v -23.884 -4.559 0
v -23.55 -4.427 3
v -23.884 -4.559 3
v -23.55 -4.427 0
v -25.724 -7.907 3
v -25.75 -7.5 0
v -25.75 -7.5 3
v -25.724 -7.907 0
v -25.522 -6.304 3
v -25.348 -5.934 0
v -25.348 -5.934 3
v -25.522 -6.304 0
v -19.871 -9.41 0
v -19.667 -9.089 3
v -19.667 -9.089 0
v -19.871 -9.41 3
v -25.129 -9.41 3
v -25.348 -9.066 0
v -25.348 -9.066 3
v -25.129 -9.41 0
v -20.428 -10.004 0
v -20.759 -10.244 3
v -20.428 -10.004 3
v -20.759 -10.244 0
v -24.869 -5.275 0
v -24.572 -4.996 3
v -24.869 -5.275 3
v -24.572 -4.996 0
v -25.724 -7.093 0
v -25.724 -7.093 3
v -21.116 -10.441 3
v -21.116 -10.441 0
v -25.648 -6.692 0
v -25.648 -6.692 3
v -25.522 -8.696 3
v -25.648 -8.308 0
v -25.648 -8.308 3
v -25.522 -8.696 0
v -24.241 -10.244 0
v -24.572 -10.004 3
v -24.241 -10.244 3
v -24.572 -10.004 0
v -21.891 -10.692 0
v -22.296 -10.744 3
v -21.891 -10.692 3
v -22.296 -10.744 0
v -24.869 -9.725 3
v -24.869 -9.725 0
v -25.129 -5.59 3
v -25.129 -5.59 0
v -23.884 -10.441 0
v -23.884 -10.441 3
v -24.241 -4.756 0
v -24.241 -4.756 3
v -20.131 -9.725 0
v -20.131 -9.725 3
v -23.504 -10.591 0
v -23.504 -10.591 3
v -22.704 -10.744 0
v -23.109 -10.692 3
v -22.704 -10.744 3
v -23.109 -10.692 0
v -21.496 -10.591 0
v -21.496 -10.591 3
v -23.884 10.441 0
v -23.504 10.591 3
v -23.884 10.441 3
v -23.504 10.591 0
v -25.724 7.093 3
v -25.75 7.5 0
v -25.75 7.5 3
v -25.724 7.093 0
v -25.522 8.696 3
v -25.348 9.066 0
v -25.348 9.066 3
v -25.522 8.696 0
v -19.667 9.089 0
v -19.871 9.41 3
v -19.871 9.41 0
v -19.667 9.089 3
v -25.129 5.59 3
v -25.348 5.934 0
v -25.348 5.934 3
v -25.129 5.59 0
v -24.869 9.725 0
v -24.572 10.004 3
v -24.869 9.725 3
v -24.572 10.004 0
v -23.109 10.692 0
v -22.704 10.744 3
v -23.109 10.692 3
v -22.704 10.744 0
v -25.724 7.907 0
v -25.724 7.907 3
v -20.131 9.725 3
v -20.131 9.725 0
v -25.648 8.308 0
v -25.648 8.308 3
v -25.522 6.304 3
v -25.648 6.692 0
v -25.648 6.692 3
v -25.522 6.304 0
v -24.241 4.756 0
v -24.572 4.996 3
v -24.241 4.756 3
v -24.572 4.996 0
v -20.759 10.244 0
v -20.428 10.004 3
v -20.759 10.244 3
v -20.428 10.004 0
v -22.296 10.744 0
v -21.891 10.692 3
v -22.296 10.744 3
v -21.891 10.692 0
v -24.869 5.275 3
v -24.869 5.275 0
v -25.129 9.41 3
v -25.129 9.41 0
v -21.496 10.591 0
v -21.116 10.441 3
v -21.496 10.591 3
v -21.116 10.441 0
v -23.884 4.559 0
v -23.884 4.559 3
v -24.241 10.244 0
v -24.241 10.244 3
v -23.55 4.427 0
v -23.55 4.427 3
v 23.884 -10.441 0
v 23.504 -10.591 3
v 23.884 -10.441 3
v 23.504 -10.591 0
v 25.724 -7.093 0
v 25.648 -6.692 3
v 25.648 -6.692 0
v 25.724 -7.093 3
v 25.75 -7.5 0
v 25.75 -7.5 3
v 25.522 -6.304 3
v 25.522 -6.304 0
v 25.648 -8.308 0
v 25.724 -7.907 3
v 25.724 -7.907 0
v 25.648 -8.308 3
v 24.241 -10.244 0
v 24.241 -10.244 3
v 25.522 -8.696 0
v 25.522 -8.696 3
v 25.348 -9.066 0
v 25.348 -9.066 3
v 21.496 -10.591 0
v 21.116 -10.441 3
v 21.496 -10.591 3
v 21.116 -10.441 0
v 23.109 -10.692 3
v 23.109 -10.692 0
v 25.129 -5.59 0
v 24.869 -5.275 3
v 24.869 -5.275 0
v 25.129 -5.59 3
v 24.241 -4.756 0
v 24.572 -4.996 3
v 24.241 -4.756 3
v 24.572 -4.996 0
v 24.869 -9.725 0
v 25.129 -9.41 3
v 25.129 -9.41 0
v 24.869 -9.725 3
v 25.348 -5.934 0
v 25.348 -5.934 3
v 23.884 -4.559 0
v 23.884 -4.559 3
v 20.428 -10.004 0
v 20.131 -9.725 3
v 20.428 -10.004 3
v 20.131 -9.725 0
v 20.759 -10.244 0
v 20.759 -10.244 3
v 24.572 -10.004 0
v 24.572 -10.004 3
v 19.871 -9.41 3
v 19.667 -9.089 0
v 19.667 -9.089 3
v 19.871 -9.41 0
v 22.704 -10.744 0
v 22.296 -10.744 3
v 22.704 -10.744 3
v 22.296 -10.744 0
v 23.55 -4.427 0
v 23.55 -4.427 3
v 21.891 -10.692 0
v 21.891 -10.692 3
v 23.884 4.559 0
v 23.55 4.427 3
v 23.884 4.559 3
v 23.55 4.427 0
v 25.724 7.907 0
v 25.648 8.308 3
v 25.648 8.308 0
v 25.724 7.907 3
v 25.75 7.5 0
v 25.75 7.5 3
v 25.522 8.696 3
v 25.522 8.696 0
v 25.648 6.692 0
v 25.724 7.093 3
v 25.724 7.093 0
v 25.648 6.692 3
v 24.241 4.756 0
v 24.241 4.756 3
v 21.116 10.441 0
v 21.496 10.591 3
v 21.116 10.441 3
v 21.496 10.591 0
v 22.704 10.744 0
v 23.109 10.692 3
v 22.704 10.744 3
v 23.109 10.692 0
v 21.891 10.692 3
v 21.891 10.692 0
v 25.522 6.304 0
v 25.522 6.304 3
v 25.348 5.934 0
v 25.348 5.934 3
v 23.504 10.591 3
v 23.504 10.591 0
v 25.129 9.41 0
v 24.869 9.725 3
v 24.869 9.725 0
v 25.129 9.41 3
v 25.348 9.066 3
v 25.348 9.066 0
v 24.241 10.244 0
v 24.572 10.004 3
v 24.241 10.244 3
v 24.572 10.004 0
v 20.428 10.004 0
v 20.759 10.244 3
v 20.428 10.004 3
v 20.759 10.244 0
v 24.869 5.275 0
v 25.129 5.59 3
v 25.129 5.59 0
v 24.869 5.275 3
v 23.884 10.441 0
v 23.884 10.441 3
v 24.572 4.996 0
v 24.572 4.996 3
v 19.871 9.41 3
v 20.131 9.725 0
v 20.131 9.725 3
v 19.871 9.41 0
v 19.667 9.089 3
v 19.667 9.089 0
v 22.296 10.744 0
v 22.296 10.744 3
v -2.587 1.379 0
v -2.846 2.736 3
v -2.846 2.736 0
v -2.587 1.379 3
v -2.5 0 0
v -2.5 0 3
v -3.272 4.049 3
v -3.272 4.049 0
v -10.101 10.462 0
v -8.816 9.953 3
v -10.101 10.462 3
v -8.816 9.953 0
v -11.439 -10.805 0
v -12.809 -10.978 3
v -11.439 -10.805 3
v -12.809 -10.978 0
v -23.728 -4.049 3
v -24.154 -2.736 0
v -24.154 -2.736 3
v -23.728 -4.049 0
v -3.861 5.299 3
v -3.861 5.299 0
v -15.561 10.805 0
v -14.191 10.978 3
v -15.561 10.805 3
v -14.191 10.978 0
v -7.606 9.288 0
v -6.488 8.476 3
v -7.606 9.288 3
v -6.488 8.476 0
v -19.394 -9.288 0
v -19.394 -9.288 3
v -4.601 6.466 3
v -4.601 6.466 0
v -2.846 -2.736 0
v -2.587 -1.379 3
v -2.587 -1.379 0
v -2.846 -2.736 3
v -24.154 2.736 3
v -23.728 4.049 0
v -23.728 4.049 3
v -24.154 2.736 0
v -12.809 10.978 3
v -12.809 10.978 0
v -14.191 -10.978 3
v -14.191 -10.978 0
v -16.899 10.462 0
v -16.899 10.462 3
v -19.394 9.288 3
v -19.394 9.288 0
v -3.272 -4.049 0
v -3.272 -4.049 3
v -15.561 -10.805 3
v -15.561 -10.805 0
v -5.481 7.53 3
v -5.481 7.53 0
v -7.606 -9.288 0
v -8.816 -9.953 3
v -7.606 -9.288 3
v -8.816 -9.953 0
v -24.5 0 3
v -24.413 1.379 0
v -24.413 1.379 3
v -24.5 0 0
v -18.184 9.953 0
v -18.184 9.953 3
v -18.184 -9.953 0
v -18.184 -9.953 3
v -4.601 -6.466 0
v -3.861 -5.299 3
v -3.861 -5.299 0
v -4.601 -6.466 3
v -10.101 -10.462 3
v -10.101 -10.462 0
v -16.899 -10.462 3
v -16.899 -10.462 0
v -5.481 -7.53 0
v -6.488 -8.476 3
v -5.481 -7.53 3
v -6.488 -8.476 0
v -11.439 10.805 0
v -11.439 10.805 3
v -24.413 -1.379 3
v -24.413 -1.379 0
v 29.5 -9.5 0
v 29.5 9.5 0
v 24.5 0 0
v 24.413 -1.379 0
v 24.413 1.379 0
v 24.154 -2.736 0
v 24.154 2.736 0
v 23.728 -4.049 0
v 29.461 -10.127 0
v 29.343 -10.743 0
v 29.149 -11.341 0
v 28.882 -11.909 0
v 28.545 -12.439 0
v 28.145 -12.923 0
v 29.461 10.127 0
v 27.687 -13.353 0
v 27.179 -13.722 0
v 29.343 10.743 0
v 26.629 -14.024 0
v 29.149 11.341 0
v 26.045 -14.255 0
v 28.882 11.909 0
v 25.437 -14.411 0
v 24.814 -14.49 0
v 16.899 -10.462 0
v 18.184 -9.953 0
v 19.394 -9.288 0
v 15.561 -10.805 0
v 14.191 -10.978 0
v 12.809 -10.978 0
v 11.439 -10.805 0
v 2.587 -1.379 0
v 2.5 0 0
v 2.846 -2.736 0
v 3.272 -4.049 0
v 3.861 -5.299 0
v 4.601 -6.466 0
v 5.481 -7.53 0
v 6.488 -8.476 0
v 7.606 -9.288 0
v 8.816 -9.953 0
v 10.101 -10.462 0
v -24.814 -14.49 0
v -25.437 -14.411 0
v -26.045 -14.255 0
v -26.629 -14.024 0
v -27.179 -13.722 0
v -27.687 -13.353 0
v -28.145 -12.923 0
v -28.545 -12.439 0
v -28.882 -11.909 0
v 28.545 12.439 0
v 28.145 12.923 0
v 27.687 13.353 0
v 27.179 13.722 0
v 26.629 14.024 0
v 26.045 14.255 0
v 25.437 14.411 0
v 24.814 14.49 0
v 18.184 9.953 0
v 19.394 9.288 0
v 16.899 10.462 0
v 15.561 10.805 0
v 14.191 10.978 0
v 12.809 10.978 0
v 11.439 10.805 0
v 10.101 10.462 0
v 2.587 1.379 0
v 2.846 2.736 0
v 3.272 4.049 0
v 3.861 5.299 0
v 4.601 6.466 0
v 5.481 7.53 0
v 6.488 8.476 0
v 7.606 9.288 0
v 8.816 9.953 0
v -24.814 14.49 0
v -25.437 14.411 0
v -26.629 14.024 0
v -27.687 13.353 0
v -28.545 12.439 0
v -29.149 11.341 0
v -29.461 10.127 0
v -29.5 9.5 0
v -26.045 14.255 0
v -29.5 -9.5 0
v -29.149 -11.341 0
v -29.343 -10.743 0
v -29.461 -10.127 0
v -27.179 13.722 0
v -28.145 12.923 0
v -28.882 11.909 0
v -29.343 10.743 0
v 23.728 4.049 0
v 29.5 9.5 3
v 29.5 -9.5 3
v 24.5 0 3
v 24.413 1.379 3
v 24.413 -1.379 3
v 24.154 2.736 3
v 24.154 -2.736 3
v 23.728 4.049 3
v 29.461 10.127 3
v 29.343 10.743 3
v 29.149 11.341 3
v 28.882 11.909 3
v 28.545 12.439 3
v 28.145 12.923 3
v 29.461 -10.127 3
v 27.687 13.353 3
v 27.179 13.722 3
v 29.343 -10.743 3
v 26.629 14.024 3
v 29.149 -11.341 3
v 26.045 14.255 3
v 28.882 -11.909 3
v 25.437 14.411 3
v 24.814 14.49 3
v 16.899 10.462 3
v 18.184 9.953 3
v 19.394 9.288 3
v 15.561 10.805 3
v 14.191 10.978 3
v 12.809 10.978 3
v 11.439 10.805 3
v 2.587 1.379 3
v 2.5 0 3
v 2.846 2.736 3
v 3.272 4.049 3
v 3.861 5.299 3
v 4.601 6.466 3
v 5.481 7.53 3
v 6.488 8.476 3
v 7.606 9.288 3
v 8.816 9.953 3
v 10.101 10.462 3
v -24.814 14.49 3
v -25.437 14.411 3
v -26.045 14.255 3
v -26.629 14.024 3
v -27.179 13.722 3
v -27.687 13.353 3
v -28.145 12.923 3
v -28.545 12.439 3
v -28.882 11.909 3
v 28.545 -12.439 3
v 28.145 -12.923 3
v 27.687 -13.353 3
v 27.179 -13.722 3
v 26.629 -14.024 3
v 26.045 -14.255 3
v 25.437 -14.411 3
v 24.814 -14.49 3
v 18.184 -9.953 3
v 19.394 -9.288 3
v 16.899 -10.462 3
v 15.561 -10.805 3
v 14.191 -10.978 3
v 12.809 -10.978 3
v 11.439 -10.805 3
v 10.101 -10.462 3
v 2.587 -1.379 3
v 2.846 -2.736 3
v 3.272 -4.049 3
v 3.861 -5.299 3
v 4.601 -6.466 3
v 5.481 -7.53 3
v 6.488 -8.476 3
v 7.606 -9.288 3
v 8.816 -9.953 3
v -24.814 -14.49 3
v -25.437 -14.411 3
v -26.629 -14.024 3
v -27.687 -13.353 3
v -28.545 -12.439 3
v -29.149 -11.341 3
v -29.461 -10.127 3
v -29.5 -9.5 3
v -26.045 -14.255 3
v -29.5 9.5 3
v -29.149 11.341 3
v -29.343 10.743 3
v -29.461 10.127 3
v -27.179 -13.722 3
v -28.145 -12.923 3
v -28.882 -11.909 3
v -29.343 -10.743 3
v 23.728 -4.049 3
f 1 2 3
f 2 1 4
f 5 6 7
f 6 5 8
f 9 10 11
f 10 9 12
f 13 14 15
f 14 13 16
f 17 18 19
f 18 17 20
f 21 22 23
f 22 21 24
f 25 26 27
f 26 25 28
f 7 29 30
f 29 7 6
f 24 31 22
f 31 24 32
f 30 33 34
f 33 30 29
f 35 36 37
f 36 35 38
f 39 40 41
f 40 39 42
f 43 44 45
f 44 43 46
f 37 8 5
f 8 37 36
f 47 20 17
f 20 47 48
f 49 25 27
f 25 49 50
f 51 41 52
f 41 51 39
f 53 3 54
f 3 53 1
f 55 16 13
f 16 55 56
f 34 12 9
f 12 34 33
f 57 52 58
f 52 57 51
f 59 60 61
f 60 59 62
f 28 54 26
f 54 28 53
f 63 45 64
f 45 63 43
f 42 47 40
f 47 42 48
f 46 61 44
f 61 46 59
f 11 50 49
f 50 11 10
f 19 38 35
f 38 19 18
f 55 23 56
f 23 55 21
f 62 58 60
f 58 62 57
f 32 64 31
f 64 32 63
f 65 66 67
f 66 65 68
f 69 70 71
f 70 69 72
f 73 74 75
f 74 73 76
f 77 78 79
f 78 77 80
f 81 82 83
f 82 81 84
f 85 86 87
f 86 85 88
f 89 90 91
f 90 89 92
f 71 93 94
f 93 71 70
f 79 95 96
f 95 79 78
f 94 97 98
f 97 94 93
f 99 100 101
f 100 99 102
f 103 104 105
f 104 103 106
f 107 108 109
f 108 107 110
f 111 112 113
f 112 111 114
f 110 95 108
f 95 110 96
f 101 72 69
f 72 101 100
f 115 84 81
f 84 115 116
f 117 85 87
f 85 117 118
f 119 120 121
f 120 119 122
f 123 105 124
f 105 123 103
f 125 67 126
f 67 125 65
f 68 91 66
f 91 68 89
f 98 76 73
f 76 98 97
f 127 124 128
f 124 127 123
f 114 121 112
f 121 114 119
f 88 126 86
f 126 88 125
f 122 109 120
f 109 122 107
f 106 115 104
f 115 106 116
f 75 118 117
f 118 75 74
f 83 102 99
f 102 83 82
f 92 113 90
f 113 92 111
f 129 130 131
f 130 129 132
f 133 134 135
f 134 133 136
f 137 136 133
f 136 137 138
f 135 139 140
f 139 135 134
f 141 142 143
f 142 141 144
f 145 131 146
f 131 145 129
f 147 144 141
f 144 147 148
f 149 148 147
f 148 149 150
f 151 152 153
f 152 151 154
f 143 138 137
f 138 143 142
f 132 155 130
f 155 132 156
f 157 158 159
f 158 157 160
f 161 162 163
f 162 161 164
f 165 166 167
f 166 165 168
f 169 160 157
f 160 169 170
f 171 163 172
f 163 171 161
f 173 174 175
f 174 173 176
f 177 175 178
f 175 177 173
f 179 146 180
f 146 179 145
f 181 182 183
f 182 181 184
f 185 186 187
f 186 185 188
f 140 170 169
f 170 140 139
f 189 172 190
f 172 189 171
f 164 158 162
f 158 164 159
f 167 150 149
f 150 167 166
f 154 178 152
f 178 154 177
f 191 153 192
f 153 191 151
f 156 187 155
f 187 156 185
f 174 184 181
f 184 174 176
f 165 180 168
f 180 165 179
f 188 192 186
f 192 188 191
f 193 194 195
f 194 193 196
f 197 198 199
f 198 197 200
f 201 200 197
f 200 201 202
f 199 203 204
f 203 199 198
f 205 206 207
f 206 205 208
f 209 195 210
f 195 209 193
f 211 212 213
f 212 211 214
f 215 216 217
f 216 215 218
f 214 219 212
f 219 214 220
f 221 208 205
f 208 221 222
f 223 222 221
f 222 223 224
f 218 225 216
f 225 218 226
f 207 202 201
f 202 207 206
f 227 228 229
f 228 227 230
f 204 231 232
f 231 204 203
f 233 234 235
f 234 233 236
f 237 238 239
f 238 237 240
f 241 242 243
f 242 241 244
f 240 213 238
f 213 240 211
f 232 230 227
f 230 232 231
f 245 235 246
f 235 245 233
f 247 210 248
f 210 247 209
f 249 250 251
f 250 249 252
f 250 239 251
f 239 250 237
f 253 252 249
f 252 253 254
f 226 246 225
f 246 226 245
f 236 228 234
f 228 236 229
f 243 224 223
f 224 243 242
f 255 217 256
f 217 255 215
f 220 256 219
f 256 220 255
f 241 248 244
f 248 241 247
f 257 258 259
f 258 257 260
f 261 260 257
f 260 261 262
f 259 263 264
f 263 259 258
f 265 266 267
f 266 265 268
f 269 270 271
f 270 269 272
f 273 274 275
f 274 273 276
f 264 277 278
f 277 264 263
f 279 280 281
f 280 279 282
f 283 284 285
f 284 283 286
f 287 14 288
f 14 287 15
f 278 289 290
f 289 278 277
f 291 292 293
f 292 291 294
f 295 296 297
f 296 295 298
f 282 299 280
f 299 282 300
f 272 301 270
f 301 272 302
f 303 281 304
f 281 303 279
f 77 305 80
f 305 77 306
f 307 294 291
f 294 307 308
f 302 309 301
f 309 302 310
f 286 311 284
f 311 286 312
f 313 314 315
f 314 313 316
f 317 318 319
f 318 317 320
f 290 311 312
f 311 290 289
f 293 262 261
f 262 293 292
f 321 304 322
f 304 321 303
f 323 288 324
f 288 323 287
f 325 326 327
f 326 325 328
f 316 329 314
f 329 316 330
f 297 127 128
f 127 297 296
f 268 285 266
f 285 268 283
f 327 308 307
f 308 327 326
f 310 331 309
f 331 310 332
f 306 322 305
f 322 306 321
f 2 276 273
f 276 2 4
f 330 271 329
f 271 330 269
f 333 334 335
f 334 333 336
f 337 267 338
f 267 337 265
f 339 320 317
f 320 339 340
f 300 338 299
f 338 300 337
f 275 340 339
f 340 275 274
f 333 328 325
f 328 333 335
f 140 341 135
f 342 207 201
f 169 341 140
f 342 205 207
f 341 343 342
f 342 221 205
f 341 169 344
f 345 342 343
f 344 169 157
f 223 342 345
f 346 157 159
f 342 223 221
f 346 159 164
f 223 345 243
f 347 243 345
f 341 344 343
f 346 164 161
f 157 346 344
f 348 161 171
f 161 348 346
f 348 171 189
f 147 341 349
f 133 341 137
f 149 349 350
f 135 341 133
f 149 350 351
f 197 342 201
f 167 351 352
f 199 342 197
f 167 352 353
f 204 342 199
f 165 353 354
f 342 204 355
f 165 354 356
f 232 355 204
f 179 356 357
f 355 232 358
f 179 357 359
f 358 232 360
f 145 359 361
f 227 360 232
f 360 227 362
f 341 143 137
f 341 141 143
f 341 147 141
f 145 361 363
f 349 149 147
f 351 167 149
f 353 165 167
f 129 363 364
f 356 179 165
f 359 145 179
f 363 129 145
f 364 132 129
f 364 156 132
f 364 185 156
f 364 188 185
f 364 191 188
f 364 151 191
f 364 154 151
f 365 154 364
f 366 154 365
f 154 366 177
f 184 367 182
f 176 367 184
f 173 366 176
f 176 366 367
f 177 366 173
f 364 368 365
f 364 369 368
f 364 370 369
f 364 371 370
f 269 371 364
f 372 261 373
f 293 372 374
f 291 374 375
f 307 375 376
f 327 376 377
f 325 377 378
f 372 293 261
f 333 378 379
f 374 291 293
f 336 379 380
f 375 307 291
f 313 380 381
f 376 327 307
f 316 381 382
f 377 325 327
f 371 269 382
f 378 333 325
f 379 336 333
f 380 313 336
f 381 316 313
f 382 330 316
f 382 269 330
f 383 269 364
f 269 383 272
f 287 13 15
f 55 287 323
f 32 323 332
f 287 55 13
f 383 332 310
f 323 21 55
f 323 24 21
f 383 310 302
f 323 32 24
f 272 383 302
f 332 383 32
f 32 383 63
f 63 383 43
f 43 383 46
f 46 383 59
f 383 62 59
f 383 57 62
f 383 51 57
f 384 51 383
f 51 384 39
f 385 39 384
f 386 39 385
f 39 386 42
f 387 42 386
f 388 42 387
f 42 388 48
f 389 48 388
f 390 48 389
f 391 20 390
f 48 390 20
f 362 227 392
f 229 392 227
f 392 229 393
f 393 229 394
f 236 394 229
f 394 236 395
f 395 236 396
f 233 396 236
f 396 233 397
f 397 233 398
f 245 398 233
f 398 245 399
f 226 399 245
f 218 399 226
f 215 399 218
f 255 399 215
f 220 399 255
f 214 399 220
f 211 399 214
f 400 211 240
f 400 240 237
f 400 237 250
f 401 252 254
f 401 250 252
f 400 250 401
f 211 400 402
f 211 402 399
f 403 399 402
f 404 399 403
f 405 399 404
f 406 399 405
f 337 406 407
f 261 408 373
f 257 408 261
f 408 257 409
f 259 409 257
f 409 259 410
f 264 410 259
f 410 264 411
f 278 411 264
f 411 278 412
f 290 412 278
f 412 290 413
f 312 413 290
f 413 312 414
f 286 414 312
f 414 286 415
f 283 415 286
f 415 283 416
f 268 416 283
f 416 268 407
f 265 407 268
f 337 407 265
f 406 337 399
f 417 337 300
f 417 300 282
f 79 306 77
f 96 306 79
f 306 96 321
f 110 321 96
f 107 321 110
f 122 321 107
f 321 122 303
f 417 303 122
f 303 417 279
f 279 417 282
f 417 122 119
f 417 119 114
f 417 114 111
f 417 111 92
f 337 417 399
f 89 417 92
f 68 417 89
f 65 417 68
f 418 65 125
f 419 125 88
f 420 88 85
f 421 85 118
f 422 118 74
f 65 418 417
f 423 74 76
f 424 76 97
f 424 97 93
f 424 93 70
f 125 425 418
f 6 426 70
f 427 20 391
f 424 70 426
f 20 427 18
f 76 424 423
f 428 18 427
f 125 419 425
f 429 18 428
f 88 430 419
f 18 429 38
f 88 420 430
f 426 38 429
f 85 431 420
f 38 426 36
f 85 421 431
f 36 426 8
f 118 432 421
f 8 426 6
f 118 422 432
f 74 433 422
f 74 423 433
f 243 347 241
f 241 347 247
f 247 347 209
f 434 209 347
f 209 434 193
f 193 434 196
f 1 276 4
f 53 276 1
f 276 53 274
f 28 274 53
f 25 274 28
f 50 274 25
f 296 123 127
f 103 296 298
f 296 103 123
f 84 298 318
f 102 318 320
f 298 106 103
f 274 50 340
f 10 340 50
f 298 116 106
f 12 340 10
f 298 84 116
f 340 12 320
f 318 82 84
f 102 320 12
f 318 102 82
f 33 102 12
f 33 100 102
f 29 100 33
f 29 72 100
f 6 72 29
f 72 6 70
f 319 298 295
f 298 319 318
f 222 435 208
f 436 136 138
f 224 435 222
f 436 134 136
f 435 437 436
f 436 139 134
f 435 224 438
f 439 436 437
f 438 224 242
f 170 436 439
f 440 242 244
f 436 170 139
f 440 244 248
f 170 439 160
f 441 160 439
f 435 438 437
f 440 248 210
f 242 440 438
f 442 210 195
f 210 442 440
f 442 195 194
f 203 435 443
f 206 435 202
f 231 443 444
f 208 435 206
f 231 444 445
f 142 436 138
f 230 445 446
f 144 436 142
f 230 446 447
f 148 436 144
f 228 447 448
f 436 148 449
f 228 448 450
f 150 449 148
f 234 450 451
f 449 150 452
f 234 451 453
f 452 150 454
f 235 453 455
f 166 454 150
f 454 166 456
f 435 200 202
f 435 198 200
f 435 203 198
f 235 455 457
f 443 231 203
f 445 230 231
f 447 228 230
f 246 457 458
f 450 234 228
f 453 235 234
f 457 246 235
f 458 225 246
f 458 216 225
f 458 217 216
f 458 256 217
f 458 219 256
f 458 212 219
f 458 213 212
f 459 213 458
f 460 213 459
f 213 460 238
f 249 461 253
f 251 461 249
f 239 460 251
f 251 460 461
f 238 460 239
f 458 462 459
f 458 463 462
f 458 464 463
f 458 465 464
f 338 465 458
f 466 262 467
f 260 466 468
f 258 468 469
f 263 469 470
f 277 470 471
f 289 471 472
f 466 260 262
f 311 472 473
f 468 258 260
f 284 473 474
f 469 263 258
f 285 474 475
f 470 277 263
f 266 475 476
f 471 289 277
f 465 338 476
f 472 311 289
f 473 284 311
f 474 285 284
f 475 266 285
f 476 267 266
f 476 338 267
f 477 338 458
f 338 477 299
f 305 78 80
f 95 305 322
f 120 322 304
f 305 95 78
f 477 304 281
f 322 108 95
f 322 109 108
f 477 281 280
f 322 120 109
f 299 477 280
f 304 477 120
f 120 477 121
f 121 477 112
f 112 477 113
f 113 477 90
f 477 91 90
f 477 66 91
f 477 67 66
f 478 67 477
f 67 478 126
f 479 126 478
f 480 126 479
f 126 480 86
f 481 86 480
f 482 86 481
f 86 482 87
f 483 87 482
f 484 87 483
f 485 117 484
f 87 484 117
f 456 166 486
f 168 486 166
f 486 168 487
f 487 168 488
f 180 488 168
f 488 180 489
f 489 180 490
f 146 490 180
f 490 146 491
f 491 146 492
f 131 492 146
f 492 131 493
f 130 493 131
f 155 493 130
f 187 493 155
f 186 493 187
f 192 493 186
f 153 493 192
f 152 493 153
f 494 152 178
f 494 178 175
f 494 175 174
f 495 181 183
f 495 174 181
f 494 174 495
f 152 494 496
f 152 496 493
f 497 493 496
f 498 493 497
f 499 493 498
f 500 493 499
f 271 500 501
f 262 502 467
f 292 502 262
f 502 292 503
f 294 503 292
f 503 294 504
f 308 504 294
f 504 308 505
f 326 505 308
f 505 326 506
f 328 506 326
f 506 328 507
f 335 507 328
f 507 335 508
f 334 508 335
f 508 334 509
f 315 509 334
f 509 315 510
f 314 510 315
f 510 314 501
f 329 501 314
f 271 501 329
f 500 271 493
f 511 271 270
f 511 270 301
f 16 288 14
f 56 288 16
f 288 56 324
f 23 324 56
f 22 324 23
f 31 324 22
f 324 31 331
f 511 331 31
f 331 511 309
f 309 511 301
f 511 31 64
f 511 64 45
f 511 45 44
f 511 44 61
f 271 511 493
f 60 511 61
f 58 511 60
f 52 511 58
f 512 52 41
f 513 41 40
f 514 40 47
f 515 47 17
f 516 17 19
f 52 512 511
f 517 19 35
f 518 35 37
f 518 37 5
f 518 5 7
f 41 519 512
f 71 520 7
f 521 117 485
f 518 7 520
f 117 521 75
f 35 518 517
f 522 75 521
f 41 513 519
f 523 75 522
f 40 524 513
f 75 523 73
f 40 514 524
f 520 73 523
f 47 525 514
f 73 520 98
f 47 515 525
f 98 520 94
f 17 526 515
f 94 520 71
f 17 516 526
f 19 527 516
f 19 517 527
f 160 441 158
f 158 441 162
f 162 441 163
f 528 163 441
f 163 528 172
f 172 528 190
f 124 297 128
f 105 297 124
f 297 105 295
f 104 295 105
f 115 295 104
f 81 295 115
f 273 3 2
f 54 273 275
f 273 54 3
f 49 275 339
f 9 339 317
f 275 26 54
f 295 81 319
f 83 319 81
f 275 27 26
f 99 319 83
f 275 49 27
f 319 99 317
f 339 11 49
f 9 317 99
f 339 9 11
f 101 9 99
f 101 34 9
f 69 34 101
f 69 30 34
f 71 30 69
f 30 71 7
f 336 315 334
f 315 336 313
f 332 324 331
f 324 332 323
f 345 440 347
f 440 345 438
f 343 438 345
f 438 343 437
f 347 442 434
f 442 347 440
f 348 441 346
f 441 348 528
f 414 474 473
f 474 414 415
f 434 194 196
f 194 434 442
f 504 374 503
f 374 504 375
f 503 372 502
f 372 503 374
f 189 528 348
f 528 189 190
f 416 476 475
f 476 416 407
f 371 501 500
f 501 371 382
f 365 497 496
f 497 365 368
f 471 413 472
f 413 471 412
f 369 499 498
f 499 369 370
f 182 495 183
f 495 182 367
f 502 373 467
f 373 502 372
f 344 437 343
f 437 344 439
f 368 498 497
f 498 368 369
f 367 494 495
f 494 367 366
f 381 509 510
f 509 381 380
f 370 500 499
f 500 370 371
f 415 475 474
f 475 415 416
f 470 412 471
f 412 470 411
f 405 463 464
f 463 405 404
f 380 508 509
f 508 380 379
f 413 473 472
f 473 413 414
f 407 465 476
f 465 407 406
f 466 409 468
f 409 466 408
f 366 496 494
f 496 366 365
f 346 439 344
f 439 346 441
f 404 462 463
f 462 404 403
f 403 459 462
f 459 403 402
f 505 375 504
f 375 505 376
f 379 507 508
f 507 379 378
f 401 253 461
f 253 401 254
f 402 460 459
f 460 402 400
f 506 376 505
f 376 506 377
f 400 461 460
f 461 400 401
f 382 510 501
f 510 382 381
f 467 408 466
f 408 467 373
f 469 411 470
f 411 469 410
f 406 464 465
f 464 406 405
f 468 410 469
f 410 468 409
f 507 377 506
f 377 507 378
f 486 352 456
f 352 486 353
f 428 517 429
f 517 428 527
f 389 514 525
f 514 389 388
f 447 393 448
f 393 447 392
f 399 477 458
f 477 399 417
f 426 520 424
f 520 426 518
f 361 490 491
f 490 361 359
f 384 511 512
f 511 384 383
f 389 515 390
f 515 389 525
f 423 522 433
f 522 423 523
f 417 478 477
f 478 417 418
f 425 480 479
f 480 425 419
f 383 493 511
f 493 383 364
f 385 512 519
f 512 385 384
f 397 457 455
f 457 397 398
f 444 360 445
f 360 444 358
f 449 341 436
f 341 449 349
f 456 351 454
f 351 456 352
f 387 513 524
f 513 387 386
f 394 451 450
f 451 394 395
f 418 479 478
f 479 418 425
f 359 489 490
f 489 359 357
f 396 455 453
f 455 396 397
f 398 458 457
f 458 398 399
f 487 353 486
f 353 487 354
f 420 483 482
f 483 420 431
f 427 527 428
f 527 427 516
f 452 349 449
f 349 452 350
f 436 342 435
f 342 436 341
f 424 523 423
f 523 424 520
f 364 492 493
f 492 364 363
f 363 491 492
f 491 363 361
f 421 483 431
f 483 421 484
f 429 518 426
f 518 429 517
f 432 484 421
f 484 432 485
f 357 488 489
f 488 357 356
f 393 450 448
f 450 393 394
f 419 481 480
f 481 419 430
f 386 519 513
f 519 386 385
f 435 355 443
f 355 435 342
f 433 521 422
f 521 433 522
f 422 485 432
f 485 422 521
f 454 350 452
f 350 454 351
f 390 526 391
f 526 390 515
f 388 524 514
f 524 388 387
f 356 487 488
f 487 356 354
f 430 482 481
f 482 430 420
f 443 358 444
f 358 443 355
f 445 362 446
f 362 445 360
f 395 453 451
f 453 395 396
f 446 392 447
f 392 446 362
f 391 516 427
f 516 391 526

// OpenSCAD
$fn = 50;


difference() {
	union() {
		hull() {
			translate(v = [-24.5000000000, 9.5000000000, 0]) {
				cylinder(h = 3, r = 5);
			}
			translate(v = [24.5000000000, 9.5000000000, 0]) {
				cylinder(h = 3, r = 5);
			}
			translate(v = [-24.5000000000, -9.5000000000, 0]) {
				cylinder(h = 3, r = 5);
			}
			translate(v = [24.5000000000, -9.5000000000, 0]) {
				cylinder(h = 3, r = 5);
			}
		}
	}
	union() {
		#translate(v = [-22.5000000000, -7.5000000000, -100.0000000000]) {
			cylinder(h = 200, r = 3.2500000000);
		}
		#translate(v = [-22.5000000000, 7.5000000000, -100.0000000000]) {
			cylinder(h = 200, r = 3.2500000000);
		}
		#translate(v = [22.5000000000, -7.5000000000, -100.0000000000]) {
			cylinder(h = 200, r = 3.2500000000);
		}
		#translate(v = [22.5000000000, 7.5000000000, -100.0000000000]) {
			cylinder(h = 200, r = 3.2500000000);
		}
		#translate(v = [-13.5000000000, 0, 0]) {
			cylinder(h = 3, r = 11.0000000000);
		}
		#translate(v = [13.5000000000, 0, 0]) {
			cylinder(h = 3, r = 11.0000000000);
		}
	}
}
